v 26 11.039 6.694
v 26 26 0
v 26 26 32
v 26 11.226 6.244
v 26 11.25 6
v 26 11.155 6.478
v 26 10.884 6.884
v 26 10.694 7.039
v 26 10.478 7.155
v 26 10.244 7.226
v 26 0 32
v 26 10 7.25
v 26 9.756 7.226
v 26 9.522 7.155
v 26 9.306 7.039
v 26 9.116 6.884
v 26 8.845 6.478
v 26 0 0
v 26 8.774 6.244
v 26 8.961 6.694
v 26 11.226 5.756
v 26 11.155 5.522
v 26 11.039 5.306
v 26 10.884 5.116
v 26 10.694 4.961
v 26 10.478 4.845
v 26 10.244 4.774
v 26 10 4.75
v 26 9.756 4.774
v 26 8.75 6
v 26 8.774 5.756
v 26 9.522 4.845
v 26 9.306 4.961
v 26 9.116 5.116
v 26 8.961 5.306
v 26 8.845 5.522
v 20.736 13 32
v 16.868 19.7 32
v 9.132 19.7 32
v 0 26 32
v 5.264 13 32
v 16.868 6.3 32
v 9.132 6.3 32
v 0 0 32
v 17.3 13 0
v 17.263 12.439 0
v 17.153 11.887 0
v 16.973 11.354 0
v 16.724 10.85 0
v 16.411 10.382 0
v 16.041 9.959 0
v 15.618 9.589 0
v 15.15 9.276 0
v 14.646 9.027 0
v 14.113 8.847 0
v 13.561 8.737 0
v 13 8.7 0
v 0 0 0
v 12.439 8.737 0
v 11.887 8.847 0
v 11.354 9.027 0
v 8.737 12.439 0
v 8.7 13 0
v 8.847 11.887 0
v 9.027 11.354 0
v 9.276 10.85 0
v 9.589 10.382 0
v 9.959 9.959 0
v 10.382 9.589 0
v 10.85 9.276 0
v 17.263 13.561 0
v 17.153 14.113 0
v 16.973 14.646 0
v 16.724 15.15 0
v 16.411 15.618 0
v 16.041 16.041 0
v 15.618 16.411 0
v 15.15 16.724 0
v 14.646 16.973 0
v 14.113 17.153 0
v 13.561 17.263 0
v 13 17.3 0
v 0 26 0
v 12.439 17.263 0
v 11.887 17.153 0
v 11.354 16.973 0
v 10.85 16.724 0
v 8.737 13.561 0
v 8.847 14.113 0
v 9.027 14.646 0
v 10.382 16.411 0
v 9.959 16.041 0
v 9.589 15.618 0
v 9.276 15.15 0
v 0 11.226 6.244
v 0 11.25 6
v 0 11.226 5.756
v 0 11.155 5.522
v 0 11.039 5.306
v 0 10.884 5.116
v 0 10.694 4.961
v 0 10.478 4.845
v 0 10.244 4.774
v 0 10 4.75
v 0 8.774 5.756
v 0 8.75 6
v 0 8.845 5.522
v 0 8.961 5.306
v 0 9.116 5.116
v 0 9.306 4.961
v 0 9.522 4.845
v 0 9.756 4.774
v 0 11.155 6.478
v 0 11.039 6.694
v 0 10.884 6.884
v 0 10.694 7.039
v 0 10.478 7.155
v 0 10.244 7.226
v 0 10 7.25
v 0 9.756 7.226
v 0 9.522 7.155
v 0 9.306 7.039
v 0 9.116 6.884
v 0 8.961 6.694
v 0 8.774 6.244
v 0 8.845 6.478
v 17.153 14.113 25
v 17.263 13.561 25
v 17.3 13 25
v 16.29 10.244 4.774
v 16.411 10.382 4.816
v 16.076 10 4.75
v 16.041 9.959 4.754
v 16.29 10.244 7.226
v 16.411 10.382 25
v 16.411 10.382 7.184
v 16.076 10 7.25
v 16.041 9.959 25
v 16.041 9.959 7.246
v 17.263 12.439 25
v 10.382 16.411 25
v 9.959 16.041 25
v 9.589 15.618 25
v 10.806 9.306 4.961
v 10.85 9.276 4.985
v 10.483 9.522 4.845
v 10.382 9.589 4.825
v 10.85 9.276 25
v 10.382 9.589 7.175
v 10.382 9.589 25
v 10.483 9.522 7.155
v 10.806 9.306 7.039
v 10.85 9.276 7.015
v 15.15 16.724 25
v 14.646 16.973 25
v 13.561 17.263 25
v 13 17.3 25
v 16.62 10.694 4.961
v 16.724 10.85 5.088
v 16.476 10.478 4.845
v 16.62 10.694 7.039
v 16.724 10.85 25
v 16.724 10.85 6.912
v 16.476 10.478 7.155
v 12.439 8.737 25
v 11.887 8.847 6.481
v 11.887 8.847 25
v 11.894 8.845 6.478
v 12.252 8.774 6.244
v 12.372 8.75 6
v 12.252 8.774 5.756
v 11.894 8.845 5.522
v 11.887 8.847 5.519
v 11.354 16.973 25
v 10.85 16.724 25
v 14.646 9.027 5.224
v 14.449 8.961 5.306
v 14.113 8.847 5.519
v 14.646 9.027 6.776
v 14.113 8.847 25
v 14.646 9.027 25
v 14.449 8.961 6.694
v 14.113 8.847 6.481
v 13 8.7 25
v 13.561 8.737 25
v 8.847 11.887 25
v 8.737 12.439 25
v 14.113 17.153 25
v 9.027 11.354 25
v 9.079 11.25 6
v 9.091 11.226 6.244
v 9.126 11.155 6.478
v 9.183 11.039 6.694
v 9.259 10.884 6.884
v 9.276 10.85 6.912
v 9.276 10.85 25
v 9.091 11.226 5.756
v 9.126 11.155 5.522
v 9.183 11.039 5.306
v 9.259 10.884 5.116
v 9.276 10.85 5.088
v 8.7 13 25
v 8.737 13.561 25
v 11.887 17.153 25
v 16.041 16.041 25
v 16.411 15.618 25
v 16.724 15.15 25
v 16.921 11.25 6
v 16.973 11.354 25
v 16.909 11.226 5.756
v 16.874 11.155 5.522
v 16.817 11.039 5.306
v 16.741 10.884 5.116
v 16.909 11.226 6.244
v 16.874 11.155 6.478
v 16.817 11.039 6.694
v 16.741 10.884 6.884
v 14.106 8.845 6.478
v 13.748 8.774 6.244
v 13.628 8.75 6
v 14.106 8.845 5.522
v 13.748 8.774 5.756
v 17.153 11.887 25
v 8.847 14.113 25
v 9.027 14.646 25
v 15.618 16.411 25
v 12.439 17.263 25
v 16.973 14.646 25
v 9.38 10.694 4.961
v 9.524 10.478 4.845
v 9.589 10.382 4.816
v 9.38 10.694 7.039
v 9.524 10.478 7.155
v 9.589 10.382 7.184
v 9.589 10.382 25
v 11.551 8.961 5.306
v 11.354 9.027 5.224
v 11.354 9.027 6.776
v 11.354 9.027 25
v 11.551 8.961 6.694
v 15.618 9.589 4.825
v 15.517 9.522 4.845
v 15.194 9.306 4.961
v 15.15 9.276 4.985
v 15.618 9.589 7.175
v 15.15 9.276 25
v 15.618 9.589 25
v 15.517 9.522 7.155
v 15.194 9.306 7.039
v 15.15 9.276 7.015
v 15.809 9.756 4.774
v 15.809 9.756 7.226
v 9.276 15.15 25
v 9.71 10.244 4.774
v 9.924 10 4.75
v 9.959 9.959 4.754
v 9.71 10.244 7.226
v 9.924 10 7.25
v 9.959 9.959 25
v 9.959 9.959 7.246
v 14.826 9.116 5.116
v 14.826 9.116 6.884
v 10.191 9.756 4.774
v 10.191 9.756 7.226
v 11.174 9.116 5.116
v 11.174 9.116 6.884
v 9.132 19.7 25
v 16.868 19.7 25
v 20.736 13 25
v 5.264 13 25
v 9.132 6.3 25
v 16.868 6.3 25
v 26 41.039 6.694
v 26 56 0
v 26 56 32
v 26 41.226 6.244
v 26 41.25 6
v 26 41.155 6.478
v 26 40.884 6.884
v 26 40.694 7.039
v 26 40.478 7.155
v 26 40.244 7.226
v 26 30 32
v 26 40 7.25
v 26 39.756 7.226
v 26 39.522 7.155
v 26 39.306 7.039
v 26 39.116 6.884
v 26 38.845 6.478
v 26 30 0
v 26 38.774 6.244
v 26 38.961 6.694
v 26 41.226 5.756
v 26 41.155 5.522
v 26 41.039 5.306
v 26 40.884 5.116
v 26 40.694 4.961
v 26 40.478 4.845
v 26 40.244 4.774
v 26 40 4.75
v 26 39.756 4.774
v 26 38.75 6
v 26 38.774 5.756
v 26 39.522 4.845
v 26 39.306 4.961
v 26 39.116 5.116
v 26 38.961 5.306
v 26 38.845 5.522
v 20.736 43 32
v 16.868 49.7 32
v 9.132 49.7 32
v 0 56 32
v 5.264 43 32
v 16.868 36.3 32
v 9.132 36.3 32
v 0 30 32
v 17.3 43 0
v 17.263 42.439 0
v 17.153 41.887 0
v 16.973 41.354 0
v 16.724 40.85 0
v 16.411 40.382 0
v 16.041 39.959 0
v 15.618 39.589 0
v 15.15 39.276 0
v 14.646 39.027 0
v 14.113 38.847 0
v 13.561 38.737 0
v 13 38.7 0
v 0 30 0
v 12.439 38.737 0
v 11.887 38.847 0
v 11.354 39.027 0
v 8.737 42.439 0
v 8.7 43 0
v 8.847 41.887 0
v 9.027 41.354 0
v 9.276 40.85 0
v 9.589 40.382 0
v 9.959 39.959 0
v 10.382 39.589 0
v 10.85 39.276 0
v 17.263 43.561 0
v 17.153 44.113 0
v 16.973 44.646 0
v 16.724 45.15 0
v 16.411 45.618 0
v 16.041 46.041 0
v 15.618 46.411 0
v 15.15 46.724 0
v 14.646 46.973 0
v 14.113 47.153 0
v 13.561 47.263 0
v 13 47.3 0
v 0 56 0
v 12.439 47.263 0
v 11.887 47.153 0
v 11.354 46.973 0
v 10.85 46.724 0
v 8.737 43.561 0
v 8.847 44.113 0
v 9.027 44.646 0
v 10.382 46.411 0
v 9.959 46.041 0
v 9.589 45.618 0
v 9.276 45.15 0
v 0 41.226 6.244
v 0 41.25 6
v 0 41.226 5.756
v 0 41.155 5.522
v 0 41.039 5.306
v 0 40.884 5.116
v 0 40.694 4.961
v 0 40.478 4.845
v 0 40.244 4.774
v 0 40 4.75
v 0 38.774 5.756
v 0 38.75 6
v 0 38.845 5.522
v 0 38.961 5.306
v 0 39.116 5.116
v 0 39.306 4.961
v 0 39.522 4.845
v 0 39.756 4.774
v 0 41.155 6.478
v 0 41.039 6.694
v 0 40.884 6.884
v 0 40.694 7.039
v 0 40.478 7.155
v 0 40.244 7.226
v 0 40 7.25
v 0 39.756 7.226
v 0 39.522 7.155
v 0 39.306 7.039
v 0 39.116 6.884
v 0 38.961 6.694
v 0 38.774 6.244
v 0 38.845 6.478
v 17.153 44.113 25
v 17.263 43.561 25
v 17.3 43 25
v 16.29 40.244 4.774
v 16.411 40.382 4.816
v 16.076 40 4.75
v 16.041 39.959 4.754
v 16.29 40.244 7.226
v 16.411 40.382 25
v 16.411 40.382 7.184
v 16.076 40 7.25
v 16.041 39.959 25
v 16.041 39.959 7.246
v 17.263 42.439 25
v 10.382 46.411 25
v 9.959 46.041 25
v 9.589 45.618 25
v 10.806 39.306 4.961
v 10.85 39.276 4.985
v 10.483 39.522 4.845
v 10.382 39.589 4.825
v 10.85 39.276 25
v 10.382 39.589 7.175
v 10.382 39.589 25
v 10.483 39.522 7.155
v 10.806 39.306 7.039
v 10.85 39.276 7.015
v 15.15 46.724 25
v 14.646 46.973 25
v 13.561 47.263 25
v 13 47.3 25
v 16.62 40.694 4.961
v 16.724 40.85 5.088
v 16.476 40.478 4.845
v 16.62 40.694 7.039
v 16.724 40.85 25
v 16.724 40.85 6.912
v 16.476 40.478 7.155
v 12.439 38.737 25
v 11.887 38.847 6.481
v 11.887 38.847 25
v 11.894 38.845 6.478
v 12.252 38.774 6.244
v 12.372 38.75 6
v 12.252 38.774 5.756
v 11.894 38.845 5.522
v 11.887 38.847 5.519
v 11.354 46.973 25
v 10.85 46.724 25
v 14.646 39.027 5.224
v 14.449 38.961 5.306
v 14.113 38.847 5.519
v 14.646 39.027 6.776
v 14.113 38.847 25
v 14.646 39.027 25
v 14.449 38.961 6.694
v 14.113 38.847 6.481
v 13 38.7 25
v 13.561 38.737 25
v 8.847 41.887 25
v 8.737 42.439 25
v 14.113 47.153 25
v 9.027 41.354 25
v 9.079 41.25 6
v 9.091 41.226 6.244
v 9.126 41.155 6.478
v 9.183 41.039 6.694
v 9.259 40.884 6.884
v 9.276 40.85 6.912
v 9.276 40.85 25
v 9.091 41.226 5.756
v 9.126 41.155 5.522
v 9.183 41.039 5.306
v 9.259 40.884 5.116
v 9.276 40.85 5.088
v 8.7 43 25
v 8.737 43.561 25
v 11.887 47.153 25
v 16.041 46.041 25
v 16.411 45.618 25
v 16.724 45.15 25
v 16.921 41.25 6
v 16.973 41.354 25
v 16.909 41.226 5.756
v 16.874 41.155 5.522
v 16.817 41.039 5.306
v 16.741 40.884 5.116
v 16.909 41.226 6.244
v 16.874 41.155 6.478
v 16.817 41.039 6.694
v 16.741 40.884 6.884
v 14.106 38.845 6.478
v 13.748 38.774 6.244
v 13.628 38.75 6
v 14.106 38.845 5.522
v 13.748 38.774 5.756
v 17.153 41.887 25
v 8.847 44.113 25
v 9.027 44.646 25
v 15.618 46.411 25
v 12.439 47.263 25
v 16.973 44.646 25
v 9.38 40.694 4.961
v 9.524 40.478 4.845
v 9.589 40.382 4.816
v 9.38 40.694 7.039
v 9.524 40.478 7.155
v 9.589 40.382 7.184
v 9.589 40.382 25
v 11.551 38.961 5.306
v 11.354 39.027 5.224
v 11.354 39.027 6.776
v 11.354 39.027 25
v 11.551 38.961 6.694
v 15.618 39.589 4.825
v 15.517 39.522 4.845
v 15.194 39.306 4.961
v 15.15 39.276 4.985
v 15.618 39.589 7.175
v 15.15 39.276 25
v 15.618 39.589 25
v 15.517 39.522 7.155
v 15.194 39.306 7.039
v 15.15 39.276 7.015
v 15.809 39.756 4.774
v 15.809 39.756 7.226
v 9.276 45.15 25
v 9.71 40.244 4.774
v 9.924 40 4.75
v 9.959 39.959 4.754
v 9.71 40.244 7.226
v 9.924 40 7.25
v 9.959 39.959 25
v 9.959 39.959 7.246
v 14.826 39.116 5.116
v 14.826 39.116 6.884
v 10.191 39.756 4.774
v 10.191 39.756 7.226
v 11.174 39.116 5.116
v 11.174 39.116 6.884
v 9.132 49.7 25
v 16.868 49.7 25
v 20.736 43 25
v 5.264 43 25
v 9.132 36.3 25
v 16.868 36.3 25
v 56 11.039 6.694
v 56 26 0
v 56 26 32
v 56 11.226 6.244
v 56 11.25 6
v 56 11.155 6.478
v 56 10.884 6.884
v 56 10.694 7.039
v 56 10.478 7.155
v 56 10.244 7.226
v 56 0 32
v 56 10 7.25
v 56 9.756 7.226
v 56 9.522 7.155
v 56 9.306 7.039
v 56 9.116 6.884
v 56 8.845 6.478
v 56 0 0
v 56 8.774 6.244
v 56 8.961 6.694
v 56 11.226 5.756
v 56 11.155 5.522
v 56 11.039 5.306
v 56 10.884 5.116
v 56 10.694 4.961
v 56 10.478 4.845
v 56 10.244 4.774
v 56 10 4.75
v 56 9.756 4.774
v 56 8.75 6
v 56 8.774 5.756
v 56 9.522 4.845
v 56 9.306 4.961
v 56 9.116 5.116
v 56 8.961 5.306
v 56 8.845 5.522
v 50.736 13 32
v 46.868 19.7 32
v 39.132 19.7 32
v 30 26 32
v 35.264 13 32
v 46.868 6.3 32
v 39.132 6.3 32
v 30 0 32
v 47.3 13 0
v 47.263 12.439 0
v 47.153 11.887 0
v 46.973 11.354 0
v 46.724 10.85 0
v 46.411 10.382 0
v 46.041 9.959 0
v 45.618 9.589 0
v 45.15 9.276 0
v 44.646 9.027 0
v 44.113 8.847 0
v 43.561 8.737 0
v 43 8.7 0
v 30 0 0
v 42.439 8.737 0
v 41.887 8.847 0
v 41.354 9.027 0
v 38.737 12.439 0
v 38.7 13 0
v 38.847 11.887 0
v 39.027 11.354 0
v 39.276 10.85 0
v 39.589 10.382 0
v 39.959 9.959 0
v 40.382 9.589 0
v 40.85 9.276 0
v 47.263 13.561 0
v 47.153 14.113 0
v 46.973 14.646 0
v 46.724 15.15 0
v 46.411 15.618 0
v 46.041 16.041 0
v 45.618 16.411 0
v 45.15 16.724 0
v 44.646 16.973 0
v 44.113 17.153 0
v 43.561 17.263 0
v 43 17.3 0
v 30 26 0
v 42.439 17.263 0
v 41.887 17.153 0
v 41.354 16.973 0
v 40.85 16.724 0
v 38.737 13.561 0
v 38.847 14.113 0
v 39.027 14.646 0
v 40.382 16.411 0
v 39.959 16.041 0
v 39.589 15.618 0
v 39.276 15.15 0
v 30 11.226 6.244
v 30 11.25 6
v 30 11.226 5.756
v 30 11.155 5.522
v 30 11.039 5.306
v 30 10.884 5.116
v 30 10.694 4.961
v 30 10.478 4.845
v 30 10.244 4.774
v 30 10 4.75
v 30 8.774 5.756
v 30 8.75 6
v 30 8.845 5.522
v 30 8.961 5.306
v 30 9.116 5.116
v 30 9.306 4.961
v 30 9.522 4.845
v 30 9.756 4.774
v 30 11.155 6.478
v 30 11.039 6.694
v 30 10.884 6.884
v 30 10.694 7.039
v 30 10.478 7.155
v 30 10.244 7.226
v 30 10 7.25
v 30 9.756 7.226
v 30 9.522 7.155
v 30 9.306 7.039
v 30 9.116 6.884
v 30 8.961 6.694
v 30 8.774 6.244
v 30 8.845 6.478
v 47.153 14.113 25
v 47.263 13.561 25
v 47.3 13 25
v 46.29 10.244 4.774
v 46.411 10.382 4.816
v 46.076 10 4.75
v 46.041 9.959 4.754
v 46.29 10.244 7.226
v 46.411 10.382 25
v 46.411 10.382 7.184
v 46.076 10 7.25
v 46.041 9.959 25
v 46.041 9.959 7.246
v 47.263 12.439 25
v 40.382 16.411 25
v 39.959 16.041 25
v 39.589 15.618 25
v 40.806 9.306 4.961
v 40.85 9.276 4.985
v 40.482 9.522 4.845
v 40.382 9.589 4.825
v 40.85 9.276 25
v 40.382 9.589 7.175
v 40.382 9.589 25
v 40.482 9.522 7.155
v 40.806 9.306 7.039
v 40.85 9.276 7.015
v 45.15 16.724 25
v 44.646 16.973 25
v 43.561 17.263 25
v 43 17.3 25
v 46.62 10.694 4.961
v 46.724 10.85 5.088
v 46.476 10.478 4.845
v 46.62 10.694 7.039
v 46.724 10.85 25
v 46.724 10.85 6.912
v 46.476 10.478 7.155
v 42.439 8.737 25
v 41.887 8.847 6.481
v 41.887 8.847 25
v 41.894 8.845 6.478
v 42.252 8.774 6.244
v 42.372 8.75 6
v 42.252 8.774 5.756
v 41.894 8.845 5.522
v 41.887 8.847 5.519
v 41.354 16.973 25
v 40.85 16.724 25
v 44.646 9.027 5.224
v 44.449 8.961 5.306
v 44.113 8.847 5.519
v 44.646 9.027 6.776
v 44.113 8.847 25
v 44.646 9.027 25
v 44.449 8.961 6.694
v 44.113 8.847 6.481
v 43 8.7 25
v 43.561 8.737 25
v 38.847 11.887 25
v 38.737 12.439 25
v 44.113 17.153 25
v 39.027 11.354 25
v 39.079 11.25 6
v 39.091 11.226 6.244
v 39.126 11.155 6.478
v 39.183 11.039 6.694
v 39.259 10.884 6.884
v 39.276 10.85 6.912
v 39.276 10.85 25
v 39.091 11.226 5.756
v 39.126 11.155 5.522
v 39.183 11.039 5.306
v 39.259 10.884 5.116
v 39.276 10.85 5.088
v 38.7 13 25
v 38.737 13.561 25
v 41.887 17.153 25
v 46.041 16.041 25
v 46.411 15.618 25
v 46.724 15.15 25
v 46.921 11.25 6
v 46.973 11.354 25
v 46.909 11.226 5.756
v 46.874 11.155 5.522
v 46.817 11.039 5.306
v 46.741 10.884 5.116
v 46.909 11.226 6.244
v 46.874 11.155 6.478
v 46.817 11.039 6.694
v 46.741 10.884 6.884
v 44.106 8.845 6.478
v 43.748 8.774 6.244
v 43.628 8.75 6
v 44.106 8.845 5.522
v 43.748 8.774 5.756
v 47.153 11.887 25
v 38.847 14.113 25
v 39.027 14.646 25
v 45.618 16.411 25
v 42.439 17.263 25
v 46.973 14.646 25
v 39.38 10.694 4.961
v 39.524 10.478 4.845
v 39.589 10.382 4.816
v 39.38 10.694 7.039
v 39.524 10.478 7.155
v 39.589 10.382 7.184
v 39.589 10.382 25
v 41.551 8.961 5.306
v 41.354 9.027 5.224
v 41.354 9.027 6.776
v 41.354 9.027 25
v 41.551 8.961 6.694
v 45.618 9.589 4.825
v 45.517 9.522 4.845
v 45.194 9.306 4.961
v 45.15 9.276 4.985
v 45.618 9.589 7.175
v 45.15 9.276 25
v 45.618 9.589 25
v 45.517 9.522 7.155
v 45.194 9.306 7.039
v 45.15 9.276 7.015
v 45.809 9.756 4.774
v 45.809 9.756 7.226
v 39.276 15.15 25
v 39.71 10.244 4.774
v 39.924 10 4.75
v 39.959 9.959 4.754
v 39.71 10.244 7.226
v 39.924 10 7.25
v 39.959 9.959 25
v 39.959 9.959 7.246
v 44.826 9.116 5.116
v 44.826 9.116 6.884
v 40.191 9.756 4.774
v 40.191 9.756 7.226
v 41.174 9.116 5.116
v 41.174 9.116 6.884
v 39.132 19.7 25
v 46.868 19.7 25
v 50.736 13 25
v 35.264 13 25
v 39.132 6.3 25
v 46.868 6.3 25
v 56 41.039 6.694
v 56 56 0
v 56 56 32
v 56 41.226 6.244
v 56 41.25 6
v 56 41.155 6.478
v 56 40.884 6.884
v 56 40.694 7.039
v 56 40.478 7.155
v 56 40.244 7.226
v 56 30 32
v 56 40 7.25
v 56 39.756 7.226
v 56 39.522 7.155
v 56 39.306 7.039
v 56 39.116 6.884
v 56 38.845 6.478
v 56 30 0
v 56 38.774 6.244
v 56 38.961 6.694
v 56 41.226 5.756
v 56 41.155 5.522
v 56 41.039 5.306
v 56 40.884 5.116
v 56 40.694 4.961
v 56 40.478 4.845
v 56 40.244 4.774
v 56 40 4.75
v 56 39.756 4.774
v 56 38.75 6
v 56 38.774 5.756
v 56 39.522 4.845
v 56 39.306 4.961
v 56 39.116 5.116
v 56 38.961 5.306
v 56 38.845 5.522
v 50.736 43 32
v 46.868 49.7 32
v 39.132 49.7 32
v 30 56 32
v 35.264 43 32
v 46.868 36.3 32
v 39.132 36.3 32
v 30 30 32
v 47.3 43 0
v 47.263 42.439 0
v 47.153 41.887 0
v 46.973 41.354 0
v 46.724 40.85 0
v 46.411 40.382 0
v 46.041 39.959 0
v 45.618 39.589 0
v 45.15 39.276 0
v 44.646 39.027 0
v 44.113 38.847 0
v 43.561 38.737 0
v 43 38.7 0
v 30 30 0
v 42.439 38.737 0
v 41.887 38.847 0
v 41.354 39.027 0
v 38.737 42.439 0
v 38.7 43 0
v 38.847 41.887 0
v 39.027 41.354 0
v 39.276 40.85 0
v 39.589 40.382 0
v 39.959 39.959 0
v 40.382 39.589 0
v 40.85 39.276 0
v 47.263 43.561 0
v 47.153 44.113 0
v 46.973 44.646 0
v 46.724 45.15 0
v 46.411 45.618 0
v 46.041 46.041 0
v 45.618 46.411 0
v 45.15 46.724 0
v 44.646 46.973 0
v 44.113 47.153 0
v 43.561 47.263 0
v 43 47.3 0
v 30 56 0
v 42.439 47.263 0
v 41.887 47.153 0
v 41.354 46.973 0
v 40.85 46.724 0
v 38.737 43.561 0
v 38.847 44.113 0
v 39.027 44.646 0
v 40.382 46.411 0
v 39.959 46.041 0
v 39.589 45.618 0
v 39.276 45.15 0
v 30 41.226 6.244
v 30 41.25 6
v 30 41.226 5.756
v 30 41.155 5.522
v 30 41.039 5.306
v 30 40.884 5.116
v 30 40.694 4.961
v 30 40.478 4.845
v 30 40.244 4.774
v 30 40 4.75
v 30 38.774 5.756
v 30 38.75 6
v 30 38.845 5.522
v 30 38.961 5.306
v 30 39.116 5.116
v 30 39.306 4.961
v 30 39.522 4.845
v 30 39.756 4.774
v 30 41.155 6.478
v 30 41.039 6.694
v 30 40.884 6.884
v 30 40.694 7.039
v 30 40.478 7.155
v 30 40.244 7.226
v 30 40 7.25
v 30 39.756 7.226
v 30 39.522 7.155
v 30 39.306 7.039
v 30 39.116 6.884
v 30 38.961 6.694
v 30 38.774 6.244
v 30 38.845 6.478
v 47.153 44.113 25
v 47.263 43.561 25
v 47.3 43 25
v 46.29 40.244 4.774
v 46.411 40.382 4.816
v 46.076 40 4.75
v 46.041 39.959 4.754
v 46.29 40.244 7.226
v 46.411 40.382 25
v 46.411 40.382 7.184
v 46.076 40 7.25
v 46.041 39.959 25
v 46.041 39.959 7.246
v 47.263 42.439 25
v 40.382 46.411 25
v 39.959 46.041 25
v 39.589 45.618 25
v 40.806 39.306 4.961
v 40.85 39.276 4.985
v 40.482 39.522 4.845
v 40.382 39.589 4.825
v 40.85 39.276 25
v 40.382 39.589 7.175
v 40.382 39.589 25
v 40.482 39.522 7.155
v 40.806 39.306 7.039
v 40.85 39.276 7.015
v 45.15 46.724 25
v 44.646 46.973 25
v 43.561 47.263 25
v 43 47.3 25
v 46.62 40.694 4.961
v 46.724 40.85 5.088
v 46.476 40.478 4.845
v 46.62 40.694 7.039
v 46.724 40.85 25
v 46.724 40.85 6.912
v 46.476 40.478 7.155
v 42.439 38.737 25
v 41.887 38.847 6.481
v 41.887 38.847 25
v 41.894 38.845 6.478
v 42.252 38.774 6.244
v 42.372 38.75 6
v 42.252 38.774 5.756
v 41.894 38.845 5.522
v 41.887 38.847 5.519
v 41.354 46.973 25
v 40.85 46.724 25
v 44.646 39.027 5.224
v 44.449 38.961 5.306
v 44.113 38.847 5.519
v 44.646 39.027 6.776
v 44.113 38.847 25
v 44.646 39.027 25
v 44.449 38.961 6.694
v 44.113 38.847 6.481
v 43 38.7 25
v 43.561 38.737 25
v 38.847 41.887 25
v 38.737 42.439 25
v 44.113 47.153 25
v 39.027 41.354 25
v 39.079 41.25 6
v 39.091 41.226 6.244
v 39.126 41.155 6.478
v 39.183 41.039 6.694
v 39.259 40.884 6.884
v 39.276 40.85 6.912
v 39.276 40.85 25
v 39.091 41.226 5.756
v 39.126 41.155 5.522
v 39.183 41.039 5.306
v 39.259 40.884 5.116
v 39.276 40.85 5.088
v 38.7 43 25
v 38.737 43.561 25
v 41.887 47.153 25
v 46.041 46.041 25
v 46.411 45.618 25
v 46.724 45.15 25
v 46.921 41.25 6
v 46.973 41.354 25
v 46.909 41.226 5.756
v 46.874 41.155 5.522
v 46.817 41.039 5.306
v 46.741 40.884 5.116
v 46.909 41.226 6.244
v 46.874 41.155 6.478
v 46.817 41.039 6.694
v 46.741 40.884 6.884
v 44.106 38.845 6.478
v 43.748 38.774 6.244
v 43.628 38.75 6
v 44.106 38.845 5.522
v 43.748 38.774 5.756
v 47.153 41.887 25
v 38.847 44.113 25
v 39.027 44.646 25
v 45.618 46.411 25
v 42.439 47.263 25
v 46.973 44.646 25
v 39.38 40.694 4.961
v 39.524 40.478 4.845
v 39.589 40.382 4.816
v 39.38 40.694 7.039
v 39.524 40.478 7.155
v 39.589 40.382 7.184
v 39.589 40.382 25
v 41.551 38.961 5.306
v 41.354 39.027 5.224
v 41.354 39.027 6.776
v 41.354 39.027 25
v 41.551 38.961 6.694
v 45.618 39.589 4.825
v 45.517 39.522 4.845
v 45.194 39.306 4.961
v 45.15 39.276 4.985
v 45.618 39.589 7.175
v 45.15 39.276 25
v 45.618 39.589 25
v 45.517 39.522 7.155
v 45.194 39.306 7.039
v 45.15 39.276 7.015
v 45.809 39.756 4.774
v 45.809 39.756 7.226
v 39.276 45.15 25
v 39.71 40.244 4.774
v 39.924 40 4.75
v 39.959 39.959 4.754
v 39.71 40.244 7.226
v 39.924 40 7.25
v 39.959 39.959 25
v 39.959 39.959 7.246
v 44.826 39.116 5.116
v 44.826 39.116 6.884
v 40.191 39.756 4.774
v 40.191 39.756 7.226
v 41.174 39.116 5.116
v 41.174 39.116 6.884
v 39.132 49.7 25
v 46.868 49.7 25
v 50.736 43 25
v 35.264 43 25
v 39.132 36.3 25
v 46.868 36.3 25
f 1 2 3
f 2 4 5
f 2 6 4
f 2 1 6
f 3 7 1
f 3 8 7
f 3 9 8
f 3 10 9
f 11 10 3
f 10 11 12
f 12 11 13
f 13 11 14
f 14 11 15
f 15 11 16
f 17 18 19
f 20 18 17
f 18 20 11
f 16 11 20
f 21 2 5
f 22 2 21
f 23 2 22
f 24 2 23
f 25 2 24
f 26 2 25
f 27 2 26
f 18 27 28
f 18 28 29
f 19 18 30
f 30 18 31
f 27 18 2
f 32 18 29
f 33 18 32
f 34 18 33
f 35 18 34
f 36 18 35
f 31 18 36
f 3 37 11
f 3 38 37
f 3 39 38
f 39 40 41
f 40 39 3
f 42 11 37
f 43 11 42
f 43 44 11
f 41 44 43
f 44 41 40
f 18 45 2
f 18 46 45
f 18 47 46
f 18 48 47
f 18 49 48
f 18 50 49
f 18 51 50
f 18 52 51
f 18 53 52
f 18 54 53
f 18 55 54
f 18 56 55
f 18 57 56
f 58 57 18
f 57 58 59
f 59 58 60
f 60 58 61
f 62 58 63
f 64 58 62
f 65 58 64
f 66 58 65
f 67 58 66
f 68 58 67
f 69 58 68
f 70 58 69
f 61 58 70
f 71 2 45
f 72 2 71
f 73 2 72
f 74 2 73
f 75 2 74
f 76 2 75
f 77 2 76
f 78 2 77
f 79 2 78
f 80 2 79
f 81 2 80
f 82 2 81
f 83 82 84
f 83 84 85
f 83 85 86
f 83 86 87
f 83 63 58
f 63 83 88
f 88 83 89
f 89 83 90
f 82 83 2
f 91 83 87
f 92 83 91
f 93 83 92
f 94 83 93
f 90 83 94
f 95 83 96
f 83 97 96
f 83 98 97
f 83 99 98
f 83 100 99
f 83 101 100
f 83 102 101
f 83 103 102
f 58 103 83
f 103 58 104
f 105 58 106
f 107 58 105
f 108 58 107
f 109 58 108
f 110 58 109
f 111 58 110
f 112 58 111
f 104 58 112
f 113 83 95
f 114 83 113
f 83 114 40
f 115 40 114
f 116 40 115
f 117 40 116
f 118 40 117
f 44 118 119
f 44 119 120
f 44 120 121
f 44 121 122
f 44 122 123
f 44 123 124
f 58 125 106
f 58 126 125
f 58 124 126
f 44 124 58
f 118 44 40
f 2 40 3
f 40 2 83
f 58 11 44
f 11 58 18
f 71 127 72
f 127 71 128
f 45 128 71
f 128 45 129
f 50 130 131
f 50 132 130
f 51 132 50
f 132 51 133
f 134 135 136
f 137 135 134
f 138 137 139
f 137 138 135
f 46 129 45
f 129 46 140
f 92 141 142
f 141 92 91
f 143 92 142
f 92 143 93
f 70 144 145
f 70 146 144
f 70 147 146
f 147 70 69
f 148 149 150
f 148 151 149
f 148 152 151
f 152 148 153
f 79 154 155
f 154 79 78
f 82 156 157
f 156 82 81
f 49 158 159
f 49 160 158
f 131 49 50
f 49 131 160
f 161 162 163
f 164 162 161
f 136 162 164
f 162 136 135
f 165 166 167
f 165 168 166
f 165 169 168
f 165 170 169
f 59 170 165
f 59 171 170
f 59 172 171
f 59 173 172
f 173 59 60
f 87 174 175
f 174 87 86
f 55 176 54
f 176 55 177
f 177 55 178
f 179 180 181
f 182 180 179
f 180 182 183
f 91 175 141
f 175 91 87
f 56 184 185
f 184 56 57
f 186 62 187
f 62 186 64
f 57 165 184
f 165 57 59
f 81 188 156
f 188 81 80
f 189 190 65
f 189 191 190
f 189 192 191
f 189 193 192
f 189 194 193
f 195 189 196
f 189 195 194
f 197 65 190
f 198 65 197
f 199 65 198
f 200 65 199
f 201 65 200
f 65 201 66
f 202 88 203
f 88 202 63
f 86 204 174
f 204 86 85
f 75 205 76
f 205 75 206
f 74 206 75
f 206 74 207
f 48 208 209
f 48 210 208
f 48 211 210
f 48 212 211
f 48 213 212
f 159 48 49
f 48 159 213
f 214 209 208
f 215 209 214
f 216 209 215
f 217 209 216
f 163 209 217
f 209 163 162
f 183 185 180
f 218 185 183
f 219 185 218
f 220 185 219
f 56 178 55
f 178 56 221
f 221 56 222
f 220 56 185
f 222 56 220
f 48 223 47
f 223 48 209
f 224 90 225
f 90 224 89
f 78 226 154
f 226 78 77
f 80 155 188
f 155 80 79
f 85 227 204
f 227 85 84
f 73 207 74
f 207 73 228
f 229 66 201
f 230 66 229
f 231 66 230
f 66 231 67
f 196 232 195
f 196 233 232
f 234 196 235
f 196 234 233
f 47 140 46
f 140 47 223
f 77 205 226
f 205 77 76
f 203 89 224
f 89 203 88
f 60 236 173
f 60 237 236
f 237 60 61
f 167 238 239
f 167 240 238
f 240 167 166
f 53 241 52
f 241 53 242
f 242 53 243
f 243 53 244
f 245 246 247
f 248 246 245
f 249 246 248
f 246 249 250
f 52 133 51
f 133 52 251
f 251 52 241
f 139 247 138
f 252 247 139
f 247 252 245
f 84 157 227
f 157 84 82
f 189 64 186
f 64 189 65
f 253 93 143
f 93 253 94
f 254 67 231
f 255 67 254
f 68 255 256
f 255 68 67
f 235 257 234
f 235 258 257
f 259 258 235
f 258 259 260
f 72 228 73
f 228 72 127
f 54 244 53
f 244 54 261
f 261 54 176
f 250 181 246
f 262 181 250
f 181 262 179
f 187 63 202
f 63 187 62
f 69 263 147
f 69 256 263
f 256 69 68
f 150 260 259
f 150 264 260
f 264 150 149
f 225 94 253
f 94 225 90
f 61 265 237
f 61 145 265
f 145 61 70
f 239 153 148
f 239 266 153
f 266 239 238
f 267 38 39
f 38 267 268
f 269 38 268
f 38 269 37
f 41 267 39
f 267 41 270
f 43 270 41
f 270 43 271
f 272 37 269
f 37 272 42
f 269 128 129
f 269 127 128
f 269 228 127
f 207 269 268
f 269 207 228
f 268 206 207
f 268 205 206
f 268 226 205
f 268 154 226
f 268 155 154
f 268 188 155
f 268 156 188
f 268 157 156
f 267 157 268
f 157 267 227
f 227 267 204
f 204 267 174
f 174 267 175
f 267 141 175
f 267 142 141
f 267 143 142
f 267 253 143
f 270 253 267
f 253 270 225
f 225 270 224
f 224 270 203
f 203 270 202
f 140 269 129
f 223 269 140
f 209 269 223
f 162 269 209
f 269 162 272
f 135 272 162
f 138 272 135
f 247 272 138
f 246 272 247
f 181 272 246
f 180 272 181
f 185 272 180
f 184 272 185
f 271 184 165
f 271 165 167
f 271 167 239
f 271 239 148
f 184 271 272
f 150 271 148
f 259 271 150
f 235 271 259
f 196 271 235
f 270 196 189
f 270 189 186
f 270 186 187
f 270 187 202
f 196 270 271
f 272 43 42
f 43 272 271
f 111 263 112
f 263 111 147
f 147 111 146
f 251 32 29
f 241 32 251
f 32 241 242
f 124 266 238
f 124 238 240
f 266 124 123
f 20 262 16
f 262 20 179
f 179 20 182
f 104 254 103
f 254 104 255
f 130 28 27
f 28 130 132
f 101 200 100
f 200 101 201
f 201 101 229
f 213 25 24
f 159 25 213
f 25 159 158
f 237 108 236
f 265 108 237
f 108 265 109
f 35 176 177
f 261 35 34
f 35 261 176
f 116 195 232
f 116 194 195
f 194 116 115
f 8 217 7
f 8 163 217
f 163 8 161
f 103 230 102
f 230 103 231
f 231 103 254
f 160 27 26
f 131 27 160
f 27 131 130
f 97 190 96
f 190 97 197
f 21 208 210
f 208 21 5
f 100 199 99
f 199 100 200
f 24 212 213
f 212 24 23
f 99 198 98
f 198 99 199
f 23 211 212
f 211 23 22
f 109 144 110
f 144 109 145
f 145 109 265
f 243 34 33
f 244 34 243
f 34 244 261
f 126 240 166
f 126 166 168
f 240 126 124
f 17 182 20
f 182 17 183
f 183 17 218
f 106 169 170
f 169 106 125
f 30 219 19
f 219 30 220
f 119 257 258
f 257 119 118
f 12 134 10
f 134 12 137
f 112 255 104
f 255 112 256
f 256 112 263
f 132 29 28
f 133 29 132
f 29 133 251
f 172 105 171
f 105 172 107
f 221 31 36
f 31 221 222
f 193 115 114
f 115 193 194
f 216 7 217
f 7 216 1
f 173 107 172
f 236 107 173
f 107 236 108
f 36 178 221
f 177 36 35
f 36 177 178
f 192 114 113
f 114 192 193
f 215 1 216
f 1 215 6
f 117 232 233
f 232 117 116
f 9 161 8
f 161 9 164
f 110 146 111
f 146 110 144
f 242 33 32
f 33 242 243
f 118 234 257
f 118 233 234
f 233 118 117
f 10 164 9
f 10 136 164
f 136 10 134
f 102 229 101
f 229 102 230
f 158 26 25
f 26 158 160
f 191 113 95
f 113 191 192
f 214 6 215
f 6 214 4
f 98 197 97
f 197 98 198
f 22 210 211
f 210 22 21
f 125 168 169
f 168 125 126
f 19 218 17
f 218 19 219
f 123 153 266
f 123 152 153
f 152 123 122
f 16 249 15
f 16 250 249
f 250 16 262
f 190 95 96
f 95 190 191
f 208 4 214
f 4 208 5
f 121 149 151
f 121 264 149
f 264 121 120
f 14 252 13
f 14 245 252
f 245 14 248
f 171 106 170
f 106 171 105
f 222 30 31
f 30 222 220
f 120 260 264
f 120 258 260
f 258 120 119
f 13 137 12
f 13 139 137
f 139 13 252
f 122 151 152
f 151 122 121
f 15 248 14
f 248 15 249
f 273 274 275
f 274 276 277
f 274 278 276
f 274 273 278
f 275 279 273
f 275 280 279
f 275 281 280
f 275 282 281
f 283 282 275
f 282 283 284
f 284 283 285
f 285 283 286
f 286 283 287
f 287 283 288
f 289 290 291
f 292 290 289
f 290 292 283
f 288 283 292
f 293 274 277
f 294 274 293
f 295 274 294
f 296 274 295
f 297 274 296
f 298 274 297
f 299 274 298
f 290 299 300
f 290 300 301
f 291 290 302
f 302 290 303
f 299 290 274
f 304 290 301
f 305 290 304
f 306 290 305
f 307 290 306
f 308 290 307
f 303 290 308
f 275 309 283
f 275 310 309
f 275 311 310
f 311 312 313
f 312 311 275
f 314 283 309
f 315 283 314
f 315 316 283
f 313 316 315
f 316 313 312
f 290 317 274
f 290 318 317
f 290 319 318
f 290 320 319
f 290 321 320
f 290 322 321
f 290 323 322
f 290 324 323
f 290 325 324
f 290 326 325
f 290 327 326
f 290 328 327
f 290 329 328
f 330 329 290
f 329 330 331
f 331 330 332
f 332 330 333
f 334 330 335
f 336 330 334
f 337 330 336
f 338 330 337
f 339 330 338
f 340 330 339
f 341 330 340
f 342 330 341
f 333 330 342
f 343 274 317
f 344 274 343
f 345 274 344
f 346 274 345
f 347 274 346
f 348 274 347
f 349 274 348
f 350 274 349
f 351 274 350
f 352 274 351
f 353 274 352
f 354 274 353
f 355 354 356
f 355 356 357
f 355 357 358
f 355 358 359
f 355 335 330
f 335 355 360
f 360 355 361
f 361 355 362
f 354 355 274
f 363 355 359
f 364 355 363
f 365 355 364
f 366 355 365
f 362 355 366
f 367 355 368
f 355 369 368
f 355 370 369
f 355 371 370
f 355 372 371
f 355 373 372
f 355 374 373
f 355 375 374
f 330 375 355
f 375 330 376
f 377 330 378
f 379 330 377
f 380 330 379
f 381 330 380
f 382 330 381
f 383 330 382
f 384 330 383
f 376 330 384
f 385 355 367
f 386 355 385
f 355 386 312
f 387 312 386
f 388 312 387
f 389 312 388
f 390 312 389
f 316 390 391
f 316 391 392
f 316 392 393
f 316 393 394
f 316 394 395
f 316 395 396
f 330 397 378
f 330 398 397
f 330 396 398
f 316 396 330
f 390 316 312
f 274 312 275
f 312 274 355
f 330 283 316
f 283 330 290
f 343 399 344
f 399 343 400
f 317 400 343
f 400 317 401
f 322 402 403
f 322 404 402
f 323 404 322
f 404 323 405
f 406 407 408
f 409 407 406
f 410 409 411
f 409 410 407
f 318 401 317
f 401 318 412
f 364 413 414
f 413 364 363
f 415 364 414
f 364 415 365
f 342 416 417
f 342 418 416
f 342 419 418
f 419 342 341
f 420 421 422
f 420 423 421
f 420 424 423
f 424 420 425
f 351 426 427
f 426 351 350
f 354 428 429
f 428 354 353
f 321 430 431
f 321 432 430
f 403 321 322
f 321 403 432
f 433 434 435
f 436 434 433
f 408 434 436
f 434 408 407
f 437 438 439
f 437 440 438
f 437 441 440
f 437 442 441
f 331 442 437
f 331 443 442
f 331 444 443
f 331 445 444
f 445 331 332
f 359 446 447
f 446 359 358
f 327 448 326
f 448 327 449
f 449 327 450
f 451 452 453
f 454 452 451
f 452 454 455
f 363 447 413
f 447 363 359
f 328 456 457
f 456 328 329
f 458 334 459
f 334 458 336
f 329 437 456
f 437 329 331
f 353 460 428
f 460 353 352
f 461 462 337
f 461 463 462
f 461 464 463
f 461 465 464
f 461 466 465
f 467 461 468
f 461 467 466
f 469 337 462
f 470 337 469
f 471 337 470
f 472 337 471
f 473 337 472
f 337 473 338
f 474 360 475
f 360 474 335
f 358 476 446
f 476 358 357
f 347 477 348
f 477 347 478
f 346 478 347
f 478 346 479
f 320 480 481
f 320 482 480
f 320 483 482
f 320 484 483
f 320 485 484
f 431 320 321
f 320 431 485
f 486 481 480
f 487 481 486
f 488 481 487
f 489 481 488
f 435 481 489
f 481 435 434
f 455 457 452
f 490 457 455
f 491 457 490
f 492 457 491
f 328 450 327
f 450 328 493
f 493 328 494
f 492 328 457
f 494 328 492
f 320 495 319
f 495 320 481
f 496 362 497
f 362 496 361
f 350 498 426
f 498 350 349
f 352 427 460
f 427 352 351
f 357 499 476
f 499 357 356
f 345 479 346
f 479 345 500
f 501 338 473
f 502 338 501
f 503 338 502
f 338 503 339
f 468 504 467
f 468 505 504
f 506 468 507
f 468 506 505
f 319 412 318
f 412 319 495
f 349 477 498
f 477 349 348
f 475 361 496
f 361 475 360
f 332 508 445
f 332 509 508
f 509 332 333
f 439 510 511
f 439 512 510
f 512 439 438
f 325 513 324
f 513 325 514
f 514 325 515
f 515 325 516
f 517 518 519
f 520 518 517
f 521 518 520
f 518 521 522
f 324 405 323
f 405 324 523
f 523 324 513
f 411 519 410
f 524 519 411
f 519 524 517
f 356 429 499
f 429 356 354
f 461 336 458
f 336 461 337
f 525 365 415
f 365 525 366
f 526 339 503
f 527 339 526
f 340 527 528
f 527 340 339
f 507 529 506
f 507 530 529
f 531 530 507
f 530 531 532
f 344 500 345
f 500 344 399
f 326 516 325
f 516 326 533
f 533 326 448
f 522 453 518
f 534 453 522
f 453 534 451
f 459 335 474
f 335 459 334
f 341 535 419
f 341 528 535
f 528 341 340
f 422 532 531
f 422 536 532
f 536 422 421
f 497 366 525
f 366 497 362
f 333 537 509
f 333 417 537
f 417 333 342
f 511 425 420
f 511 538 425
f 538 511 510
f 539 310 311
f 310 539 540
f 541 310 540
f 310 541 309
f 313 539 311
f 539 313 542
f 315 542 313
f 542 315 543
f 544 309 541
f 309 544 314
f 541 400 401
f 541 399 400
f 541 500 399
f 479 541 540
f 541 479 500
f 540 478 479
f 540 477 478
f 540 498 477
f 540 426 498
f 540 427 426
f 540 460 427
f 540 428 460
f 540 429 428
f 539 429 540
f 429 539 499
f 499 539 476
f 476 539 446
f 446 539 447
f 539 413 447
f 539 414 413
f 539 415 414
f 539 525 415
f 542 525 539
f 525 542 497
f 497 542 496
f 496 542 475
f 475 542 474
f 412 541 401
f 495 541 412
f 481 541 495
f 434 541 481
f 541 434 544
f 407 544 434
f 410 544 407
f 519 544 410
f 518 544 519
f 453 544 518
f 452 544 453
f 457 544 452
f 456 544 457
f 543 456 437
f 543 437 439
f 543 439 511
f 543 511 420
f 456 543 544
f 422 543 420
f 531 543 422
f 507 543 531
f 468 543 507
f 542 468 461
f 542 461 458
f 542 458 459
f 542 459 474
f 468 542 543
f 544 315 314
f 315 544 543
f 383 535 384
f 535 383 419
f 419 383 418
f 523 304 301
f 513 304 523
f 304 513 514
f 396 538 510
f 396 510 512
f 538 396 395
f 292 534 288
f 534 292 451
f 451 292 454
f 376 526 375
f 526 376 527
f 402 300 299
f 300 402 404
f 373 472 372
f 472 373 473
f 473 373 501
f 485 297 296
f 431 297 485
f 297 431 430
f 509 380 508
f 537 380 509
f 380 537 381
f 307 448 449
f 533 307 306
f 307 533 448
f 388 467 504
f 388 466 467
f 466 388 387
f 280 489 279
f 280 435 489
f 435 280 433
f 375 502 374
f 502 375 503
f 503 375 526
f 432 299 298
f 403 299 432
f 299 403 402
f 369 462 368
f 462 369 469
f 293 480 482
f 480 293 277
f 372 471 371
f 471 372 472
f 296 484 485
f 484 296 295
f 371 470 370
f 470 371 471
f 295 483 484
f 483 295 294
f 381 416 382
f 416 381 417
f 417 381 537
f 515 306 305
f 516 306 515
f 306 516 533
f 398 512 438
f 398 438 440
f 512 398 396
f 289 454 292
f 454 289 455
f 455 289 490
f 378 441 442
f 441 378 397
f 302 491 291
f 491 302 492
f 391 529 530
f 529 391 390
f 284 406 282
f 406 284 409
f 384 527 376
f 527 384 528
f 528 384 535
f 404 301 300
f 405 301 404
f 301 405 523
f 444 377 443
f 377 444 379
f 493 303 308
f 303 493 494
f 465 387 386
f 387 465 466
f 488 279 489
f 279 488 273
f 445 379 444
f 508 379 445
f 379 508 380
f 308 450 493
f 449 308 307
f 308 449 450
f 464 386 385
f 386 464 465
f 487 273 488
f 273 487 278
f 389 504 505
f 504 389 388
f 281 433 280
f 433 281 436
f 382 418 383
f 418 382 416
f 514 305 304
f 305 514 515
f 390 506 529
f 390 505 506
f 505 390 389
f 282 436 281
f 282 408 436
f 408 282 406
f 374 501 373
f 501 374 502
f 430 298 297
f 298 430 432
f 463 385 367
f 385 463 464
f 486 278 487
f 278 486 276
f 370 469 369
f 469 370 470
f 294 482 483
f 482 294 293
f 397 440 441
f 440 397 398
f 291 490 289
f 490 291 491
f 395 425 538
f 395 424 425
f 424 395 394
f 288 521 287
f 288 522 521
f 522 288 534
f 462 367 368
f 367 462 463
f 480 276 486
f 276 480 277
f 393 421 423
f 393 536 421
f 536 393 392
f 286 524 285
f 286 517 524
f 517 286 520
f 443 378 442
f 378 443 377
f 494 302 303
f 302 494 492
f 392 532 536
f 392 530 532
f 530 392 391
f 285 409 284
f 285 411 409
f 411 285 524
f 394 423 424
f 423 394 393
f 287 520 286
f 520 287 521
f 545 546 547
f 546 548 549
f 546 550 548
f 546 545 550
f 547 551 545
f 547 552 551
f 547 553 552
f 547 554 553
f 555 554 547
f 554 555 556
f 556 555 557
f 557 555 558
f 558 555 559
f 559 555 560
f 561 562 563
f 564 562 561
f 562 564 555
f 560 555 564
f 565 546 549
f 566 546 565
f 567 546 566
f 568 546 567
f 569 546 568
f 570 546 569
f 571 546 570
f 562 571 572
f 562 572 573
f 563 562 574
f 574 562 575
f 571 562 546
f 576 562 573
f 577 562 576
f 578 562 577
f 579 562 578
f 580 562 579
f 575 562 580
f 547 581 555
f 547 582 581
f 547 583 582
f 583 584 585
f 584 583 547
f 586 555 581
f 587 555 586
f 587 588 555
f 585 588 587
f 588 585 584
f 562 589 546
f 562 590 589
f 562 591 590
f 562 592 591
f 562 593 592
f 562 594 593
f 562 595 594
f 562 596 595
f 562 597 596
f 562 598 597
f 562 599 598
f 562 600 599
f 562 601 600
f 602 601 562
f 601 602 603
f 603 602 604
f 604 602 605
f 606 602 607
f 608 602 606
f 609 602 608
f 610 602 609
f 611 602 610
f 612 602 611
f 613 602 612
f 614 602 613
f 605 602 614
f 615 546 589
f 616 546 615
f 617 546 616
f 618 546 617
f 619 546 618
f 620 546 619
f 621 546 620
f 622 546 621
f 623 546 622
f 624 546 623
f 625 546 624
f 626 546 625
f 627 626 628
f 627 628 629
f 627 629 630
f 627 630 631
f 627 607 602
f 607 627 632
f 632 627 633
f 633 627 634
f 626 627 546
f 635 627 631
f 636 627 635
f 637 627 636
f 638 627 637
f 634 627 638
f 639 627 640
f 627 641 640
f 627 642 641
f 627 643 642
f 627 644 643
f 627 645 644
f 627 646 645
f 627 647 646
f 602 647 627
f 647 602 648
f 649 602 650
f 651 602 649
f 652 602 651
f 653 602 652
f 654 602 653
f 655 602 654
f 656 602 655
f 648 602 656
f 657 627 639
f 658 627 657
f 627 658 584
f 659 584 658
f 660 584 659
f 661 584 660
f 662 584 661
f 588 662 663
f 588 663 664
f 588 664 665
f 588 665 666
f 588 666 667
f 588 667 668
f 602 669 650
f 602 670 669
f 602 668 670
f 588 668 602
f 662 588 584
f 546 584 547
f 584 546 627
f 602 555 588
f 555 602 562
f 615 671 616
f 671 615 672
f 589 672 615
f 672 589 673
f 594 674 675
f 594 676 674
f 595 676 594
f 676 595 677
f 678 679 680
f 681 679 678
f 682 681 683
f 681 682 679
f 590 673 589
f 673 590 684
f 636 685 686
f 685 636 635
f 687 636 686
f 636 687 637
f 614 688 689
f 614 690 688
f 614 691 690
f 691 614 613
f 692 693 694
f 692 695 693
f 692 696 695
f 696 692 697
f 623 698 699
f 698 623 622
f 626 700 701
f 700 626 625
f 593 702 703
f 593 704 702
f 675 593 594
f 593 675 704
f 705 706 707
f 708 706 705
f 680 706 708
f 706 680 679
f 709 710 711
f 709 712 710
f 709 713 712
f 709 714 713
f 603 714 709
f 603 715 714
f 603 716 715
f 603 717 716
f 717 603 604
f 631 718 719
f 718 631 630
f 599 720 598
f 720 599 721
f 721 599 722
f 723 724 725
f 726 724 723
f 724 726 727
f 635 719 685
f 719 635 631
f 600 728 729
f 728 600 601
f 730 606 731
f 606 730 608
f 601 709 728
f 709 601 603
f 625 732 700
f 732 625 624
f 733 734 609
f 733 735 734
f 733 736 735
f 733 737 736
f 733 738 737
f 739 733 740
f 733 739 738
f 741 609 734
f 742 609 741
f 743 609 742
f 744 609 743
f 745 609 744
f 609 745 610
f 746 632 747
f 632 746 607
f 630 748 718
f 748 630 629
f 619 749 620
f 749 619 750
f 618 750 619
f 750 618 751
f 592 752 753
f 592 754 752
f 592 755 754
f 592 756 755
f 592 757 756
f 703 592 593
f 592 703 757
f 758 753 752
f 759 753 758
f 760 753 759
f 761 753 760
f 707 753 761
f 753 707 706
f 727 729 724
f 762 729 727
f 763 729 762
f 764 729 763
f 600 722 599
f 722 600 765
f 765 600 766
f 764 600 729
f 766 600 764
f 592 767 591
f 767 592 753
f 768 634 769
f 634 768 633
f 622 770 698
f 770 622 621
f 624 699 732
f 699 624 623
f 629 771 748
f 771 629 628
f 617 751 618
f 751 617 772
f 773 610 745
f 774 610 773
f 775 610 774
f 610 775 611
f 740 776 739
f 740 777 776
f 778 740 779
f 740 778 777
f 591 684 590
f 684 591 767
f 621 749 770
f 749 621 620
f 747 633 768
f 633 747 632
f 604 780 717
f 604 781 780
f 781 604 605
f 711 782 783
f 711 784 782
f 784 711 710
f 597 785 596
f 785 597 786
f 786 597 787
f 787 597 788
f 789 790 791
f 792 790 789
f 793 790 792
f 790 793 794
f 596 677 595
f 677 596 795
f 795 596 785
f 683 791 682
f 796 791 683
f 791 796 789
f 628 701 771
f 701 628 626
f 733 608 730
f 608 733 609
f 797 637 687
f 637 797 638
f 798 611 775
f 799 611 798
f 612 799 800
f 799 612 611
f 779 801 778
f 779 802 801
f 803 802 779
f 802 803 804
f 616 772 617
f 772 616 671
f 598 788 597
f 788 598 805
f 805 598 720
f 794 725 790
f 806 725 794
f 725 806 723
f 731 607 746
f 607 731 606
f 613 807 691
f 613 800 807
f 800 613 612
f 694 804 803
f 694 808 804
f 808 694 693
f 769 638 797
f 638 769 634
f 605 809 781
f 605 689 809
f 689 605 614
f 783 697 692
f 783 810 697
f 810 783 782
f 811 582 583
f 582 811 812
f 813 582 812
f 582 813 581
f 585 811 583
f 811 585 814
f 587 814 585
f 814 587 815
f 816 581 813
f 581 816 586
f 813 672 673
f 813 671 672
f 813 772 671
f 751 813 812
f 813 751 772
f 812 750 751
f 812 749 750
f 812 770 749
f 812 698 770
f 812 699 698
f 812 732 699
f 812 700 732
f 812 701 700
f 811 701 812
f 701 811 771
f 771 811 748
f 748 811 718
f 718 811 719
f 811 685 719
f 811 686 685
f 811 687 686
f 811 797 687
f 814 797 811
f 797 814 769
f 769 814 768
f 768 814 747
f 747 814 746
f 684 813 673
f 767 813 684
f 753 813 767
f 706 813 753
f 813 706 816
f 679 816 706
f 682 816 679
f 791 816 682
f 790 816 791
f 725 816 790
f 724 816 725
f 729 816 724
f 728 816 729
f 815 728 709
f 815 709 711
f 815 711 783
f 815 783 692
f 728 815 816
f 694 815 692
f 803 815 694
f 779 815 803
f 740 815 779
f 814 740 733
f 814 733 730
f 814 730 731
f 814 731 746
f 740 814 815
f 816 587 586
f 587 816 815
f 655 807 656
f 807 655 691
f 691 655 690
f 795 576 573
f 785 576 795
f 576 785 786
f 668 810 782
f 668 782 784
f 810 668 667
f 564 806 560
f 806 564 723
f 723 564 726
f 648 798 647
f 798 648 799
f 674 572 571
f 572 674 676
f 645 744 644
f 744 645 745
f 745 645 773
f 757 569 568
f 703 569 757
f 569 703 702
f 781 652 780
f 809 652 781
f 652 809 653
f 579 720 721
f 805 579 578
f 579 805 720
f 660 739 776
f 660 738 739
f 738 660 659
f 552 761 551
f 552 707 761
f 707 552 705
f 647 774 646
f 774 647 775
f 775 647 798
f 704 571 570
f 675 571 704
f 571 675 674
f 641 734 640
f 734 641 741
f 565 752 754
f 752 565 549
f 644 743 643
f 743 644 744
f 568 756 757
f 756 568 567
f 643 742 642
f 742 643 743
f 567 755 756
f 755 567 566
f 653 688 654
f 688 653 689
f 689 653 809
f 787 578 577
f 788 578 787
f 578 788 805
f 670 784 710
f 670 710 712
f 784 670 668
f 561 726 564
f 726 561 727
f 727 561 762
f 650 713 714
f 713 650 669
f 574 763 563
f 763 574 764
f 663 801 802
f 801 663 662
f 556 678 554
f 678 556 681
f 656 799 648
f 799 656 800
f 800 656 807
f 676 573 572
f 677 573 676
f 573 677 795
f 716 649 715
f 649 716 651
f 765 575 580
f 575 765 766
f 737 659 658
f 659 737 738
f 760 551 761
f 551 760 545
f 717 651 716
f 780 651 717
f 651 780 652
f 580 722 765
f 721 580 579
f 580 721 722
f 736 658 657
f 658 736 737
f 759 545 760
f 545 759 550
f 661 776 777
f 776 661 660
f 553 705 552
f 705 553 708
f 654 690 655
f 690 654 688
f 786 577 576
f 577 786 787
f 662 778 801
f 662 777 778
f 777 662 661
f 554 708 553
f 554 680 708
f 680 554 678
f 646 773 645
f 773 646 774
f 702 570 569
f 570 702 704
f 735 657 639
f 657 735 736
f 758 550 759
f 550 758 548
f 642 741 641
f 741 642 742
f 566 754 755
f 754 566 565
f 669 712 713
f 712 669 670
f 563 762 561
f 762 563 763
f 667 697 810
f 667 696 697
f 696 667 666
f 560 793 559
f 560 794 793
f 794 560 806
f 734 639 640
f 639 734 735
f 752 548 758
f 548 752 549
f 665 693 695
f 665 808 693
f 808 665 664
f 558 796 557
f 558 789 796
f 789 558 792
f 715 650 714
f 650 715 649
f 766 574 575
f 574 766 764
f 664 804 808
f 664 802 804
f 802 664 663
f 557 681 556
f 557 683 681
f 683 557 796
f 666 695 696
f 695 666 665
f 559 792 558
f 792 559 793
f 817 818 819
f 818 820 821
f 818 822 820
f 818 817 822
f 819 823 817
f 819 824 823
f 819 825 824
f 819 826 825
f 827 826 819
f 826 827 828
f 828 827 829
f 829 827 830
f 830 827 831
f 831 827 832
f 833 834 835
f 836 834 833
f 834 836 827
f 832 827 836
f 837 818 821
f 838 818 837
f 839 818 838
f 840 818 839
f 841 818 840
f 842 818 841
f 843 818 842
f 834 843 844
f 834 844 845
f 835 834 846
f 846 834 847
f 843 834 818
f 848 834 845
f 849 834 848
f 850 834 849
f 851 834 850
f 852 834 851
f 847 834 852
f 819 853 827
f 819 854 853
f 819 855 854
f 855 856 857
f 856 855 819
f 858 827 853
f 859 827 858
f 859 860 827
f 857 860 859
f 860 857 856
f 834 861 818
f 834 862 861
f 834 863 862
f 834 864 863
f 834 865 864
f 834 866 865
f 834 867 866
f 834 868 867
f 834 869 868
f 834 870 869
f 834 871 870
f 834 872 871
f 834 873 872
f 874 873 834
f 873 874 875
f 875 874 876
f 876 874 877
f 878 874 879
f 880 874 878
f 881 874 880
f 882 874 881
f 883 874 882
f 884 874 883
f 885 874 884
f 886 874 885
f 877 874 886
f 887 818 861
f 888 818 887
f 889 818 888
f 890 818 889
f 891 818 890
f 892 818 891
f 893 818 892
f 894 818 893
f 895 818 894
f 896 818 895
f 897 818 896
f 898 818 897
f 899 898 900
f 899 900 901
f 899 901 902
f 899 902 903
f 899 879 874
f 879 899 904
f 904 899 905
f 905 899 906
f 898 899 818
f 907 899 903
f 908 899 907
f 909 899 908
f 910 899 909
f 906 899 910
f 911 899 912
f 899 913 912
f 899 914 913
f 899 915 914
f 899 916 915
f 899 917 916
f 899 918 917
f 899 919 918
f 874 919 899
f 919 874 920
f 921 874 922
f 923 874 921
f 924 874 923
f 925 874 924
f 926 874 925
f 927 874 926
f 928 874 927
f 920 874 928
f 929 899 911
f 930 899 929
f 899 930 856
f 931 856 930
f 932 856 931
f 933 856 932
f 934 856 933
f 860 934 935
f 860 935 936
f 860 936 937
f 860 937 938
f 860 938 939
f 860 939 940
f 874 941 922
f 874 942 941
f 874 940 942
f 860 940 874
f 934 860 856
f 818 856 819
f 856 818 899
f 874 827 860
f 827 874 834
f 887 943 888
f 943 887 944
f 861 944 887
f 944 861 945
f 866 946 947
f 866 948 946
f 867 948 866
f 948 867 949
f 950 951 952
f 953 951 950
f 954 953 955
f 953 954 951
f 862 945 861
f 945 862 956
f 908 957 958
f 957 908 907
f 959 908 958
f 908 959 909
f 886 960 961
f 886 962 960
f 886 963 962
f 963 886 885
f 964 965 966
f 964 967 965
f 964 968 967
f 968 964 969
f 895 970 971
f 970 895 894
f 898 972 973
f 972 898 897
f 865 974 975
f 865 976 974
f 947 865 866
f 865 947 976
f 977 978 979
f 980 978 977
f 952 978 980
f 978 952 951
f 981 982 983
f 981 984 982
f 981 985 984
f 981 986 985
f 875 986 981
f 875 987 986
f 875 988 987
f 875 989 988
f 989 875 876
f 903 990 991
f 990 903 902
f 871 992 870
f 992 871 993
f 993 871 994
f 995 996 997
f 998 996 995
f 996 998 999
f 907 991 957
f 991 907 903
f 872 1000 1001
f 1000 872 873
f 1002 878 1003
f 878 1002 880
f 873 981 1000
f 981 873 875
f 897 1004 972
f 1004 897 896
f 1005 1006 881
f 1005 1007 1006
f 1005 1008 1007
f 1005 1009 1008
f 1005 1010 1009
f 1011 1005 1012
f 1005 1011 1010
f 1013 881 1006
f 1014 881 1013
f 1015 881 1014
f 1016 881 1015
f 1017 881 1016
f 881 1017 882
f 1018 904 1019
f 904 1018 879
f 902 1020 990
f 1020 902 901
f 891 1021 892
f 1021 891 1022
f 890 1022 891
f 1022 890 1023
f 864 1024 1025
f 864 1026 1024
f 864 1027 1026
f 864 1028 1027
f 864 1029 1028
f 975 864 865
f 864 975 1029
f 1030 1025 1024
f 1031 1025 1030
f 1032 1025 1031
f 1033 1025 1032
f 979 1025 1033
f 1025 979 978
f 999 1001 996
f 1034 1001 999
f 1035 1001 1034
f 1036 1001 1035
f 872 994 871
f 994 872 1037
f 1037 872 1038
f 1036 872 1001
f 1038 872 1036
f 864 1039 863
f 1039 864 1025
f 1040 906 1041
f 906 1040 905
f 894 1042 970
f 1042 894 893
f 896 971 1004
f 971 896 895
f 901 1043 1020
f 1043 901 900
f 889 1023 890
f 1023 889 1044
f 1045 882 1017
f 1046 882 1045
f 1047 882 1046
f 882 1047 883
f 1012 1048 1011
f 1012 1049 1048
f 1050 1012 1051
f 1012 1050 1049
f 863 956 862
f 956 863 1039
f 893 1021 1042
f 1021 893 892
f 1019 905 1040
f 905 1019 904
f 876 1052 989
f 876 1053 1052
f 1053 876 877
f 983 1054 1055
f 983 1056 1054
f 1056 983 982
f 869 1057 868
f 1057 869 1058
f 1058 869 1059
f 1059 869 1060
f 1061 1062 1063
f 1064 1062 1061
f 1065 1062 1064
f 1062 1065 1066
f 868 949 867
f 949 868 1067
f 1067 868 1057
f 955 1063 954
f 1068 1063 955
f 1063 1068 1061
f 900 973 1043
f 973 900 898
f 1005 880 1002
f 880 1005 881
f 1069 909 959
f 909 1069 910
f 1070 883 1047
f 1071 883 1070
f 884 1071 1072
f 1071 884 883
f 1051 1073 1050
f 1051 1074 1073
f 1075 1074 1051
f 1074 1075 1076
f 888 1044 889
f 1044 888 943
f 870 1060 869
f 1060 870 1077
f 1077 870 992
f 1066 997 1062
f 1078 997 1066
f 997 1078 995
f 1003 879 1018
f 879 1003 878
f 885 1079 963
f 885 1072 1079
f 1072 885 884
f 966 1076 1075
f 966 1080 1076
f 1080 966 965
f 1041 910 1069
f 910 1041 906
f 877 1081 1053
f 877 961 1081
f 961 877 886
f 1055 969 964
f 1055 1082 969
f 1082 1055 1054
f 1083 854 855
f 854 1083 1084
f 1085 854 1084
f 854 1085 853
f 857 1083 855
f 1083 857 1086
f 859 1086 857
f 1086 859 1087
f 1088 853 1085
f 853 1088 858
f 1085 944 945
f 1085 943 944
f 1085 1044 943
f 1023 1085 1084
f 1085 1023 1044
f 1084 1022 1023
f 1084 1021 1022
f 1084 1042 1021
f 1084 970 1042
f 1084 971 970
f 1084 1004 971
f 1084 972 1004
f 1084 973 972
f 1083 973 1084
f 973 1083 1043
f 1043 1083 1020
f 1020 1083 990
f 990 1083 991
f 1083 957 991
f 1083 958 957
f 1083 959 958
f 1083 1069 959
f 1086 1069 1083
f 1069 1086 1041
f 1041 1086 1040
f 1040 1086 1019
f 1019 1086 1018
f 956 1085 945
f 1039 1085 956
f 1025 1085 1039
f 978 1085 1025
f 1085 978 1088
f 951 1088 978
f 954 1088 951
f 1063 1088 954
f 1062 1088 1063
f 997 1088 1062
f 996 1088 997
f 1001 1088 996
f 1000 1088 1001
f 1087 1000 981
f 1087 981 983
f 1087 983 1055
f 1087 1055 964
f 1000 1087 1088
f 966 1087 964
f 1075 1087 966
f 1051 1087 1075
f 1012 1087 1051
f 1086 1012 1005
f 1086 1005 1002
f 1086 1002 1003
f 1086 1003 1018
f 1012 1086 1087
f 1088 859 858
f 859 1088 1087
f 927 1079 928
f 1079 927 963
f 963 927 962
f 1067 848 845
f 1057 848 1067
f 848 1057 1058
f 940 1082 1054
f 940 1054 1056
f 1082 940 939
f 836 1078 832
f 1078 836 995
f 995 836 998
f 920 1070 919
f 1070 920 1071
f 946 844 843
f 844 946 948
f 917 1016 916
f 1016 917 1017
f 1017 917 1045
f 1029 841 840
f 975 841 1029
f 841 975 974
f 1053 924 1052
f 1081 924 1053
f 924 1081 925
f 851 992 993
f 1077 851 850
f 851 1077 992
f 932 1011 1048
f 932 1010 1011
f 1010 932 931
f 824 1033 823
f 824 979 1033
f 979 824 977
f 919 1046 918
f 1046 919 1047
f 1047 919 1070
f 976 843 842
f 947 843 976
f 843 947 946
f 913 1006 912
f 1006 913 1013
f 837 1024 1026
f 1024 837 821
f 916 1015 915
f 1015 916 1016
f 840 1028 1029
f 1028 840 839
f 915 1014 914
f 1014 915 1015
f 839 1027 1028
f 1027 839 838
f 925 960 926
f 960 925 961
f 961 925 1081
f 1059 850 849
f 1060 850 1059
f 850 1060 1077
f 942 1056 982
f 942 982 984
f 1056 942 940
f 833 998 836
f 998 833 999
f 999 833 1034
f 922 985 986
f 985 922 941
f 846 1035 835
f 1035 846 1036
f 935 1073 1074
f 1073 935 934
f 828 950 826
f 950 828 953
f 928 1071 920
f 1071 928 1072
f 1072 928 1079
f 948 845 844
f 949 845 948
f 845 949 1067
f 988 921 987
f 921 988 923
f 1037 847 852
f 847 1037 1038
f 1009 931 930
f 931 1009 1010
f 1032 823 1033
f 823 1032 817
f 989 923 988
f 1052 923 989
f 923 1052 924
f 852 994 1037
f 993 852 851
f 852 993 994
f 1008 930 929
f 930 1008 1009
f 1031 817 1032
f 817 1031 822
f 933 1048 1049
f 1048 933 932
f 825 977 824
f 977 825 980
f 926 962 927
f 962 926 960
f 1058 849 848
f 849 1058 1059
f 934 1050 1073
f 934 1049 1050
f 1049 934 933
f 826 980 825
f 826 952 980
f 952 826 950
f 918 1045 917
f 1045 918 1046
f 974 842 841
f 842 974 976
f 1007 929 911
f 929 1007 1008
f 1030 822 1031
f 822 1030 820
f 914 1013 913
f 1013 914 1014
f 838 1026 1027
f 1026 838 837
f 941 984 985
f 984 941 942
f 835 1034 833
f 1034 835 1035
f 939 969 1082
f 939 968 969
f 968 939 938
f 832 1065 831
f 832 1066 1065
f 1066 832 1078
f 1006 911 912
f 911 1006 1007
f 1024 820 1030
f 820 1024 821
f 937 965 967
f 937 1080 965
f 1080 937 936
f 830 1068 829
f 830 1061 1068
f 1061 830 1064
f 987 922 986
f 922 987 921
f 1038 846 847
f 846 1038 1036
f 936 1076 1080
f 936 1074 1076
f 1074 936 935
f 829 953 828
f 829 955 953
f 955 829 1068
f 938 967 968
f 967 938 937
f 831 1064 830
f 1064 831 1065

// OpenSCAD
// 四个垫块：与原底板角块同尺寸同孔位，只是更高。垫在原底板下面把整机顶高。
// 26x26, 高 = blk_h(12, 与原块顶面对齐用) + post_h(20 垫高) = 32
// 中心 M8 竖孔(脚,Ø8.6通孔+顶部螺母槽), 侧面 M3 底孔(Ø2.5), 与原块一致。
blk=26; blk_h=12; post_h=20; blk_c=86;
lf_nut_af=13.0; lf_nut_h=6.5; lf_hole=8.6;
m3_pilot=2.5; m3_z=6; m3_off=10;
H = blk_h+post_h;   // 32
module post(){
  difference(){
    cube([blk,blk,H]);
    // M8 竖孔：从下往上通孔 + 顶部螺母槽（螺母从上放）
    translate([blk/2,blk/2,-1]) cylinder(d=lf_hole,h=H+2,$fn=48);
    translate([blk/2,blk/2,H-lf_nut_h-0.5]) cylinder(d=(lf_nut_af+0.4)/cos(30),h=lf_nut_h+1,$fn=6);
    // M3 底孔从侧面进（与原块同侧同高）
    translate([blk/2, m3_off+blk/2-blk/2, m3_z]) rotate([0,90,0]) translate([-blk/2,0,0])
      translate([blk/2,0,0]) cylinder(d=m3_pilot,h=blk+2,center=true,$fn=32);
  }
}
for(x=[0,1],y=[0,1]) translate([x*(blk+4),y*(blk+4),0]) post();
